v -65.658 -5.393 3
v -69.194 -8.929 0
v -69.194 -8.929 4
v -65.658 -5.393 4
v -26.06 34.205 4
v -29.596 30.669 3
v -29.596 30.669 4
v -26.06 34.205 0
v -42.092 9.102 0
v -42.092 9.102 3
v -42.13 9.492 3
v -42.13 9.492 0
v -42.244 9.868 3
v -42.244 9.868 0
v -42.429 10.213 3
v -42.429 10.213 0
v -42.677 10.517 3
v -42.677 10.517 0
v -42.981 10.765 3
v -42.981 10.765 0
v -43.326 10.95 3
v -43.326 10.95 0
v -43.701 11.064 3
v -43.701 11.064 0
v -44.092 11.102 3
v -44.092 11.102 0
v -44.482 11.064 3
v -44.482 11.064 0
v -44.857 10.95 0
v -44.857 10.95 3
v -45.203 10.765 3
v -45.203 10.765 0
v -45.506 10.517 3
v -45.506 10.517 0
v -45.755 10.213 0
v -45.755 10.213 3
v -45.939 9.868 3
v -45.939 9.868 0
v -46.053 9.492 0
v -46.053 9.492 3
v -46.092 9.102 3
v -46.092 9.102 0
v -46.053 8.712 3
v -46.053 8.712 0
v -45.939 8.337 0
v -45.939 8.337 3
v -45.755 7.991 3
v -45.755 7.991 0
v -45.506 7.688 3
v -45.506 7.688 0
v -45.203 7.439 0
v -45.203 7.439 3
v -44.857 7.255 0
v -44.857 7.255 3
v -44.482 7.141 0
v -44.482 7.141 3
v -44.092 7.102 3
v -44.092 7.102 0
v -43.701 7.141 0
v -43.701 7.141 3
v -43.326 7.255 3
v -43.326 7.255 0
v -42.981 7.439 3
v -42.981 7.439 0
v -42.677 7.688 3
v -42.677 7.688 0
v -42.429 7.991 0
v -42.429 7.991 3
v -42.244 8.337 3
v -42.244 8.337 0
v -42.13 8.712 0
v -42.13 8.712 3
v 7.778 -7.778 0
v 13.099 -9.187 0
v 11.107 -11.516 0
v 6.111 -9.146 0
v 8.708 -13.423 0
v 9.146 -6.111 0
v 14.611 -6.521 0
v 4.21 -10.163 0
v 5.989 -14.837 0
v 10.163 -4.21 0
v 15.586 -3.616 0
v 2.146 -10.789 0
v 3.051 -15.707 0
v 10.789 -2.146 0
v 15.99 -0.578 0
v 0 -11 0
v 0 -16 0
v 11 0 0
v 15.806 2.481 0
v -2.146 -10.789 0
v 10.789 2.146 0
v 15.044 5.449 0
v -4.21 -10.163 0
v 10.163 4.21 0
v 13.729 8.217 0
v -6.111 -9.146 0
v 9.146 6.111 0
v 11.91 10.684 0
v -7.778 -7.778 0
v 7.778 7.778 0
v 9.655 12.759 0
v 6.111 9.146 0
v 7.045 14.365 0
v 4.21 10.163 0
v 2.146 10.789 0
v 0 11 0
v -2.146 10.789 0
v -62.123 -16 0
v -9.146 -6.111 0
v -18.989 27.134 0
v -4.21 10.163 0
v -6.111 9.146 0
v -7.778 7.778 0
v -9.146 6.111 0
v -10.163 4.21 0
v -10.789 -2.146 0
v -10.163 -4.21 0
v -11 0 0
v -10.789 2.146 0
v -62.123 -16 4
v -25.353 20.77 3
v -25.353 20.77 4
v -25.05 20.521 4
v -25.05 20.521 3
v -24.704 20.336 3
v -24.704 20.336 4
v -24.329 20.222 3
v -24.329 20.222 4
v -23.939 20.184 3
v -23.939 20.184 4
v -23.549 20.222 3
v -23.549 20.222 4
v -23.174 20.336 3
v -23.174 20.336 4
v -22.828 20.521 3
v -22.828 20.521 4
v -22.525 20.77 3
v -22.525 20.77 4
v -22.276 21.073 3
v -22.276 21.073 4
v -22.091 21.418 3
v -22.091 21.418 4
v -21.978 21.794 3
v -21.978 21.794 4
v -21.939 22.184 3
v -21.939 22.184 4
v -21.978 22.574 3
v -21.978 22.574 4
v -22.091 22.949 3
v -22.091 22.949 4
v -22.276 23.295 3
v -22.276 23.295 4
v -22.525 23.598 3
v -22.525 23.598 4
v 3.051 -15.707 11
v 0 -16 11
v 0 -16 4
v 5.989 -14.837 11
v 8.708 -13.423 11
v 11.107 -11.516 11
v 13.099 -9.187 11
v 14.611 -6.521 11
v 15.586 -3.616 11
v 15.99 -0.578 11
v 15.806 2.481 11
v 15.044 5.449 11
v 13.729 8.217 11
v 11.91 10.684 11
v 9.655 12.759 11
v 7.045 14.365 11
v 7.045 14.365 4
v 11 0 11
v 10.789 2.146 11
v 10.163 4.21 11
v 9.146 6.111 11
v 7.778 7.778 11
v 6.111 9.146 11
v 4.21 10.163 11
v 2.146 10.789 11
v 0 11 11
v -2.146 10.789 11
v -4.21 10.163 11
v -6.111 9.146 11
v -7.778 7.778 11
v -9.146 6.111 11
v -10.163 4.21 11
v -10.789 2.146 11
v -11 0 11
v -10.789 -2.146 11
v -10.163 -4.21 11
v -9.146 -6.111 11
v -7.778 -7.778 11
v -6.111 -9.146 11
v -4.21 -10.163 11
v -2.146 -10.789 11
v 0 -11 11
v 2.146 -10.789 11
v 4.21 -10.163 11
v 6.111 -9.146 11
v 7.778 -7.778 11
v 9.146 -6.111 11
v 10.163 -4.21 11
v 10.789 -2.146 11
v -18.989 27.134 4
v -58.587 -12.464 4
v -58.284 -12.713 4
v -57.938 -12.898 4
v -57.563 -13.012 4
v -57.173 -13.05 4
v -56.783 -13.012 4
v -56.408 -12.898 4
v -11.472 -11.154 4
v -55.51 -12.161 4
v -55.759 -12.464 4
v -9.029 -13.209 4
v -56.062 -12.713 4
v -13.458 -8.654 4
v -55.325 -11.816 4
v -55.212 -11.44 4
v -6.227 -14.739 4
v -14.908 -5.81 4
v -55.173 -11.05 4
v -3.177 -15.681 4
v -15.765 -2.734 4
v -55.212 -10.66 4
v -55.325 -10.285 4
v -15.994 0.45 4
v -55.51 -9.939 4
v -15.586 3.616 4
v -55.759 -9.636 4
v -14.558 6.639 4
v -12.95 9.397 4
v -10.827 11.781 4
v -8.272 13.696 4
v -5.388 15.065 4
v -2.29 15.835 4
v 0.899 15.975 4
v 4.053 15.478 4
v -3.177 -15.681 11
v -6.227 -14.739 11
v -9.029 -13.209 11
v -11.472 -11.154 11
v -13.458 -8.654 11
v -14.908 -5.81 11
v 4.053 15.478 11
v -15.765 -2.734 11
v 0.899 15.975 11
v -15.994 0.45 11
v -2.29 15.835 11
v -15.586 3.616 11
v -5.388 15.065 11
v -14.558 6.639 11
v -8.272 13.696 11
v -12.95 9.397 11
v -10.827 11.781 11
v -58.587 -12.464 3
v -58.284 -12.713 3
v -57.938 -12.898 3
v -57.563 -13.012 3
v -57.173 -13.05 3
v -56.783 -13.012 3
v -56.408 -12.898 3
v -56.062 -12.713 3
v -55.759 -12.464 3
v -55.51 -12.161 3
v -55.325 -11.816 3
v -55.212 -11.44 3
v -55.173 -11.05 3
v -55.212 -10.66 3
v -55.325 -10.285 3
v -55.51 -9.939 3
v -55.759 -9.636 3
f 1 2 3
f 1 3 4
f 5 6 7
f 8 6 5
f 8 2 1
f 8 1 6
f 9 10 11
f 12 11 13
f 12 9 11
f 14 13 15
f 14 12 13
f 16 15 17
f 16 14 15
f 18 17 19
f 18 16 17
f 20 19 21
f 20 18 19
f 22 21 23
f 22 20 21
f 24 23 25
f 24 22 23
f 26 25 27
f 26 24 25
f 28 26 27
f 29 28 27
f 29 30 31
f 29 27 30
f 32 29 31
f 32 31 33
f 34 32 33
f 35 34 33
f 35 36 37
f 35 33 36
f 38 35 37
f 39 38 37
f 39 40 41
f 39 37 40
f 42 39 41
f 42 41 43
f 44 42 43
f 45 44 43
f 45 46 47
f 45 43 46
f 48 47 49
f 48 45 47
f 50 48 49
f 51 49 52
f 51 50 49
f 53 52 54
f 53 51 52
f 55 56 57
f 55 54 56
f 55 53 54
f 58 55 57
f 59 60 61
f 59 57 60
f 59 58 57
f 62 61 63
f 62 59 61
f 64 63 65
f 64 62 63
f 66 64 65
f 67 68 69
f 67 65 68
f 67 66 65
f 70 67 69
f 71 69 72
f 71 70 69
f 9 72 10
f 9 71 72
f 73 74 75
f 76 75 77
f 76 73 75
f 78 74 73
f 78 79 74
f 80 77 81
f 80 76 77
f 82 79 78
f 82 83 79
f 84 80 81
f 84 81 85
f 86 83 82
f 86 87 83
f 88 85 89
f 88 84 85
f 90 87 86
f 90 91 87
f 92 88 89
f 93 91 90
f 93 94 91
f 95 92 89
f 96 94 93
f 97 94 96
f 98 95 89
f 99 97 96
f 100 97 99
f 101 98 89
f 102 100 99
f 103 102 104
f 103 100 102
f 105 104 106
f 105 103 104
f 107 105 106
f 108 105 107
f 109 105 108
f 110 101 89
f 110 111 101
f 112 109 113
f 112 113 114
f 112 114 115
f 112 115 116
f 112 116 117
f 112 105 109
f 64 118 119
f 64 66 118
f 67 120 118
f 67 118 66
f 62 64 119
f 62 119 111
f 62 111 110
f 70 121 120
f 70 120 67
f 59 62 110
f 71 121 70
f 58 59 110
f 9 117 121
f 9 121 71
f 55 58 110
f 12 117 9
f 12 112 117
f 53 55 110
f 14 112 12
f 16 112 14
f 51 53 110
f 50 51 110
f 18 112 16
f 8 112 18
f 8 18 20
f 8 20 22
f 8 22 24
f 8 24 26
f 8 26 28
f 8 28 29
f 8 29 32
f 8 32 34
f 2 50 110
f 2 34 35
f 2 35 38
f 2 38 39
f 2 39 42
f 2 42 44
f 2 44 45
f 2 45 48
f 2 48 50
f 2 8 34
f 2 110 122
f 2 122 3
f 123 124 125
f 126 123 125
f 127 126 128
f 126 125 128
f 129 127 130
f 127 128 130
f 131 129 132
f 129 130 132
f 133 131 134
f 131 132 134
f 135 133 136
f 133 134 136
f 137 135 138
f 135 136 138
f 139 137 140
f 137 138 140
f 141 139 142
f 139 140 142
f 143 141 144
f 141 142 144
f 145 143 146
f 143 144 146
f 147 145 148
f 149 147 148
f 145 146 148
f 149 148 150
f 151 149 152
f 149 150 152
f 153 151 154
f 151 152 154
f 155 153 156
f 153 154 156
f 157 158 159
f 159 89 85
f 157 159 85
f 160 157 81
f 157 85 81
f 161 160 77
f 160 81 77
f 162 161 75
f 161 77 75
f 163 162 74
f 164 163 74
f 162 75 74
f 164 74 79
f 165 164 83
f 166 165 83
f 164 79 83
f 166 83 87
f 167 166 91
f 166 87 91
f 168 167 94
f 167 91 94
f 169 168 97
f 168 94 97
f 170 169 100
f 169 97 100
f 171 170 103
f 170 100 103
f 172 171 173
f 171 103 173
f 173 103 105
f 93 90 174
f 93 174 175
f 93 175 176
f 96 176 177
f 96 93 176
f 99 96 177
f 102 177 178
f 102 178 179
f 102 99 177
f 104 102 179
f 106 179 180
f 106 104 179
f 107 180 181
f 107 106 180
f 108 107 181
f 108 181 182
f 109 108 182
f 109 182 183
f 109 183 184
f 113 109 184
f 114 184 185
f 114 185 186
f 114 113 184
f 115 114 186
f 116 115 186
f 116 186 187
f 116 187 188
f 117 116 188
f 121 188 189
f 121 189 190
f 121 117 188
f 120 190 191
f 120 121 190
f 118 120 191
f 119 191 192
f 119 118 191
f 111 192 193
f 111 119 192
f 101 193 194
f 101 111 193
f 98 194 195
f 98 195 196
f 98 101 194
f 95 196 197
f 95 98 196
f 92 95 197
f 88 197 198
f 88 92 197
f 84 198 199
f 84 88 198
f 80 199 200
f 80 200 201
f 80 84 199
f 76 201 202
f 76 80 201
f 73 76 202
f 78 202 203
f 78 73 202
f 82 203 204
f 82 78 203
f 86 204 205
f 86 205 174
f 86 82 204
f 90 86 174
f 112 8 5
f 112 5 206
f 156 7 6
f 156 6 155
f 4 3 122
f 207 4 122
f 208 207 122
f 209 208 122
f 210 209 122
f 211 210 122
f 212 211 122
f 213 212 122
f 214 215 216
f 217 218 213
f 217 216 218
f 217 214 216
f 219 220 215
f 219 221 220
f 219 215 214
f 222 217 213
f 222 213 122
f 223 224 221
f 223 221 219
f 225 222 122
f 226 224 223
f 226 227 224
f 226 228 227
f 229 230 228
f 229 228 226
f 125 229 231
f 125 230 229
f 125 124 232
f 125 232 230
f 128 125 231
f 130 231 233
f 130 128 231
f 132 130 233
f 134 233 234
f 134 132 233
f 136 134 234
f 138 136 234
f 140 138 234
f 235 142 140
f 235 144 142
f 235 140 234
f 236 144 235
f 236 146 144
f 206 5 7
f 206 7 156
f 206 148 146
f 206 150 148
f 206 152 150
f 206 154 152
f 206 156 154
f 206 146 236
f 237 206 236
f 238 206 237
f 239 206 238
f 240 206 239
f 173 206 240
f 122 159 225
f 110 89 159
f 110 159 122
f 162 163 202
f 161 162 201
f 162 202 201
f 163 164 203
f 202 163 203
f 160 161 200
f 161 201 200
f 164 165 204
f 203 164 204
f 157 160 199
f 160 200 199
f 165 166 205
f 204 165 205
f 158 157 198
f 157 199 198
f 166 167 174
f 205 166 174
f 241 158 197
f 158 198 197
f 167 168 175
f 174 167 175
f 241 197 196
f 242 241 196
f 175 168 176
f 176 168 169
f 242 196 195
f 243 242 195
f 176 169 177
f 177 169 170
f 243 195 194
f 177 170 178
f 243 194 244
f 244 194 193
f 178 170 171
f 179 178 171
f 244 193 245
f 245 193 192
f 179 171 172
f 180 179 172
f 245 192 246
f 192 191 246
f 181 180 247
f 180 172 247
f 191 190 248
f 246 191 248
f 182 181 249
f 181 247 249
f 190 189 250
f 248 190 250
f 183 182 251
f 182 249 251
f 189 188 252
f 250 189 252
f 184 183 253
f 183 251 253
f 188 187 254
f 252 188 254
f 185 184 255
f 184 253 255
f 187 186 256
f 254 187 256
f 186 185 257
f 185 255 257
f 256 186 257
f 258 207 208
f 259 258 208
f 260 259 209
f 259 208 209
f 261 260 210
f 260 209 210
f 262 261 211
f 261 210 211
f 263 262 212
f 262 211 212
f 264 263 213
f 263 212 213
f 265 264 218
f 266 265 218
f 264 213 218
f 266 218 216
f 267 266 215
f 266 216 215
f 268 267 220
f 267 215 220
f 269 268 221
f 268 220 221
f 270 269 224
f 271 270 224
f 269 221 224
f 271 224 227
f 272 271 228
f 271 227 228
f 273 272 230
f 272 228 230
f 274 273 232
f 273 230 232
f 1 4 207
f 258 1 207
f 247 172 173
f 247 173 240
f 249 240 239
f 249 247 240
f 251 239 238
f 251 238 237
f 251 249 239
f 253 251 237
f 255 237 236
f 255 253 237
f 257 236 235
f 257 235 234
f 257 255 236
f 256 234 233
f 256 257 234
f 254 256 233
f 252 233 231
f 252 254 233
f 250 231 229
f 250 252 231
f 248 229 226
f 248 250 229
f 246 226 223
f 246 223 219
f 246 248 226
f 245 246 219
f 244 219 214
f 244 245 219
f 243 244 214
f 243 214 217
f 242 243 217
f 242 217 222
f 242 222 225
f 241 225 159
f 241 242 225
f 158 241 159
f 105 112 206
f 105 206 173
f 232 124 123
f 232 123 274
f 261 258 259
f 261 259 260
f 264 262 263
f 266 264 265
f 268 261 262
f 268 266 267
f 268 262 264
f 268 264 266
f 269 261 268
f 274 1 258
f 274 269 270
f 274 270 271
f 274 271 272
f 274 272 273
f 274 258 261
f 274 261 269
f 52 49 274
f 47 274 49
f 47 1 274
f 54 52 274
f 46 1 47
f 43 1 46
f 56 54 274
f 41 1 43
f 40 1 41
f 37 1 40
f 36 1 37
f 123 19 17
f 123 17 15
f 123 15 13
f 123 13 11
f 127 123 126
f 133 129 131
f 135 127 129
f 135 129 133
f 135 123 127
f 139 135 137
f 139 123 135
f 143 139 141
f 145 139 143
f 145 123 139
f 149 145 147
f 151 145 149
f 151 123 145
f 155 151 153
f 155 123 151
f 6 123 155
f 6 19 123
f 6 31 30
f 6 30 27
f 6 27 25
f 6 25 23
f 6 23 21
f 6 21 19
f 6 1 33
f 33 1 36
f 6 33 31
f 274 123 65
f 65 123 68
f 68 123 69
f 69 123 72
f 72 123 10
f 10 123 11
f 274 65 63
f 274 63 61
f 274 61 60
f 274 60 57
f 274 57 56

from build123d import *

# Parameters (mm, degrees)
SKETCH_R        = 11
SKETCH_R_2      = 2
PAD_DEPTH       = 11
POCKET_DEPTH    = 7
POCKET001_DEPTH = 1


with BuildPart() as part:
    # Sketch → Pad (new body)
    with BuildSketch(Plane.XY):
        with BuildLine():
            Line((0, -16), (-62.122878, -16))
            Line((-62.122878, -16), (-69.193946, -8.928932))
            Line((-69.193946, -8.928932), (-26.060432, 34.204581))
            Line((-26.060432, 34.204581), (-18.989365, 27.133514))
            Line((-18.989365, 27.133514), (7.04521, 14.36541))
            ThreePointArc((0, -16), (15.585996, -3.616174), (7.04521, 14.36541))
        make_face()
        Circle(SKETCH_R, mode=Mode.SUBTRACT)
        with Locations((-44.091655, 9.102291)):
            Circle(SKETCH_R_2, mode=Mode.SUBTRACT)
    extrude(amount=PAD_DEPTH)

    # Sketch002 → Pocket (cut)
    with BuildSketch(Plane.XY.offset(11)):
        with BuildLine():
            Line((7.04521, 14.36541), (-18.989365, 27.133514))
            Line((-18.989365, 27.133514), (-26.060432, 34.204581))
            Line((-26.060432, 34.204581), (-69.193946, -8.928932))
            Line((-69.193946, -8.928932), (-62.122878, -16))
            Line((-62.122878, -16), (0, -16))
            ThreePointArc((7.04521, 14.36541), (-15.585996, 3.616174), (0, -16))
        make_face()
    extrude(amount=-POCKET_DEPTH, mode=Mode.SUBTRACT)

    # Sketch003 → Pocket001 (cut)
    with BuildSketch(Plane.XY.offset(4)):
        with BuildLine():
            Line((-65.658412, -5.393398), (-58.587344, -12.464466))
            ThreePointArc((-58.587344, -12.464466), (-55.758917, -12.464466), (-55.758917, -9.636039))
            Line((-25.353326, 20.769553), (-55.758917, -9.636039))
            ThreePointArc((-25.353326, 20.769553), (-22.524899, 20.769553), (-22.524899, 23.59798))
            Line((-29.595966, 30.669048), (-22.524899, 23.59798))
            Line((-65.658412, -5.393398), (-29.595966, 30.669048))
        make_face()
    extrude(amount=-POCKET001_DEPTH, mode=Mode.SUBTRACT)


solid = part.part
